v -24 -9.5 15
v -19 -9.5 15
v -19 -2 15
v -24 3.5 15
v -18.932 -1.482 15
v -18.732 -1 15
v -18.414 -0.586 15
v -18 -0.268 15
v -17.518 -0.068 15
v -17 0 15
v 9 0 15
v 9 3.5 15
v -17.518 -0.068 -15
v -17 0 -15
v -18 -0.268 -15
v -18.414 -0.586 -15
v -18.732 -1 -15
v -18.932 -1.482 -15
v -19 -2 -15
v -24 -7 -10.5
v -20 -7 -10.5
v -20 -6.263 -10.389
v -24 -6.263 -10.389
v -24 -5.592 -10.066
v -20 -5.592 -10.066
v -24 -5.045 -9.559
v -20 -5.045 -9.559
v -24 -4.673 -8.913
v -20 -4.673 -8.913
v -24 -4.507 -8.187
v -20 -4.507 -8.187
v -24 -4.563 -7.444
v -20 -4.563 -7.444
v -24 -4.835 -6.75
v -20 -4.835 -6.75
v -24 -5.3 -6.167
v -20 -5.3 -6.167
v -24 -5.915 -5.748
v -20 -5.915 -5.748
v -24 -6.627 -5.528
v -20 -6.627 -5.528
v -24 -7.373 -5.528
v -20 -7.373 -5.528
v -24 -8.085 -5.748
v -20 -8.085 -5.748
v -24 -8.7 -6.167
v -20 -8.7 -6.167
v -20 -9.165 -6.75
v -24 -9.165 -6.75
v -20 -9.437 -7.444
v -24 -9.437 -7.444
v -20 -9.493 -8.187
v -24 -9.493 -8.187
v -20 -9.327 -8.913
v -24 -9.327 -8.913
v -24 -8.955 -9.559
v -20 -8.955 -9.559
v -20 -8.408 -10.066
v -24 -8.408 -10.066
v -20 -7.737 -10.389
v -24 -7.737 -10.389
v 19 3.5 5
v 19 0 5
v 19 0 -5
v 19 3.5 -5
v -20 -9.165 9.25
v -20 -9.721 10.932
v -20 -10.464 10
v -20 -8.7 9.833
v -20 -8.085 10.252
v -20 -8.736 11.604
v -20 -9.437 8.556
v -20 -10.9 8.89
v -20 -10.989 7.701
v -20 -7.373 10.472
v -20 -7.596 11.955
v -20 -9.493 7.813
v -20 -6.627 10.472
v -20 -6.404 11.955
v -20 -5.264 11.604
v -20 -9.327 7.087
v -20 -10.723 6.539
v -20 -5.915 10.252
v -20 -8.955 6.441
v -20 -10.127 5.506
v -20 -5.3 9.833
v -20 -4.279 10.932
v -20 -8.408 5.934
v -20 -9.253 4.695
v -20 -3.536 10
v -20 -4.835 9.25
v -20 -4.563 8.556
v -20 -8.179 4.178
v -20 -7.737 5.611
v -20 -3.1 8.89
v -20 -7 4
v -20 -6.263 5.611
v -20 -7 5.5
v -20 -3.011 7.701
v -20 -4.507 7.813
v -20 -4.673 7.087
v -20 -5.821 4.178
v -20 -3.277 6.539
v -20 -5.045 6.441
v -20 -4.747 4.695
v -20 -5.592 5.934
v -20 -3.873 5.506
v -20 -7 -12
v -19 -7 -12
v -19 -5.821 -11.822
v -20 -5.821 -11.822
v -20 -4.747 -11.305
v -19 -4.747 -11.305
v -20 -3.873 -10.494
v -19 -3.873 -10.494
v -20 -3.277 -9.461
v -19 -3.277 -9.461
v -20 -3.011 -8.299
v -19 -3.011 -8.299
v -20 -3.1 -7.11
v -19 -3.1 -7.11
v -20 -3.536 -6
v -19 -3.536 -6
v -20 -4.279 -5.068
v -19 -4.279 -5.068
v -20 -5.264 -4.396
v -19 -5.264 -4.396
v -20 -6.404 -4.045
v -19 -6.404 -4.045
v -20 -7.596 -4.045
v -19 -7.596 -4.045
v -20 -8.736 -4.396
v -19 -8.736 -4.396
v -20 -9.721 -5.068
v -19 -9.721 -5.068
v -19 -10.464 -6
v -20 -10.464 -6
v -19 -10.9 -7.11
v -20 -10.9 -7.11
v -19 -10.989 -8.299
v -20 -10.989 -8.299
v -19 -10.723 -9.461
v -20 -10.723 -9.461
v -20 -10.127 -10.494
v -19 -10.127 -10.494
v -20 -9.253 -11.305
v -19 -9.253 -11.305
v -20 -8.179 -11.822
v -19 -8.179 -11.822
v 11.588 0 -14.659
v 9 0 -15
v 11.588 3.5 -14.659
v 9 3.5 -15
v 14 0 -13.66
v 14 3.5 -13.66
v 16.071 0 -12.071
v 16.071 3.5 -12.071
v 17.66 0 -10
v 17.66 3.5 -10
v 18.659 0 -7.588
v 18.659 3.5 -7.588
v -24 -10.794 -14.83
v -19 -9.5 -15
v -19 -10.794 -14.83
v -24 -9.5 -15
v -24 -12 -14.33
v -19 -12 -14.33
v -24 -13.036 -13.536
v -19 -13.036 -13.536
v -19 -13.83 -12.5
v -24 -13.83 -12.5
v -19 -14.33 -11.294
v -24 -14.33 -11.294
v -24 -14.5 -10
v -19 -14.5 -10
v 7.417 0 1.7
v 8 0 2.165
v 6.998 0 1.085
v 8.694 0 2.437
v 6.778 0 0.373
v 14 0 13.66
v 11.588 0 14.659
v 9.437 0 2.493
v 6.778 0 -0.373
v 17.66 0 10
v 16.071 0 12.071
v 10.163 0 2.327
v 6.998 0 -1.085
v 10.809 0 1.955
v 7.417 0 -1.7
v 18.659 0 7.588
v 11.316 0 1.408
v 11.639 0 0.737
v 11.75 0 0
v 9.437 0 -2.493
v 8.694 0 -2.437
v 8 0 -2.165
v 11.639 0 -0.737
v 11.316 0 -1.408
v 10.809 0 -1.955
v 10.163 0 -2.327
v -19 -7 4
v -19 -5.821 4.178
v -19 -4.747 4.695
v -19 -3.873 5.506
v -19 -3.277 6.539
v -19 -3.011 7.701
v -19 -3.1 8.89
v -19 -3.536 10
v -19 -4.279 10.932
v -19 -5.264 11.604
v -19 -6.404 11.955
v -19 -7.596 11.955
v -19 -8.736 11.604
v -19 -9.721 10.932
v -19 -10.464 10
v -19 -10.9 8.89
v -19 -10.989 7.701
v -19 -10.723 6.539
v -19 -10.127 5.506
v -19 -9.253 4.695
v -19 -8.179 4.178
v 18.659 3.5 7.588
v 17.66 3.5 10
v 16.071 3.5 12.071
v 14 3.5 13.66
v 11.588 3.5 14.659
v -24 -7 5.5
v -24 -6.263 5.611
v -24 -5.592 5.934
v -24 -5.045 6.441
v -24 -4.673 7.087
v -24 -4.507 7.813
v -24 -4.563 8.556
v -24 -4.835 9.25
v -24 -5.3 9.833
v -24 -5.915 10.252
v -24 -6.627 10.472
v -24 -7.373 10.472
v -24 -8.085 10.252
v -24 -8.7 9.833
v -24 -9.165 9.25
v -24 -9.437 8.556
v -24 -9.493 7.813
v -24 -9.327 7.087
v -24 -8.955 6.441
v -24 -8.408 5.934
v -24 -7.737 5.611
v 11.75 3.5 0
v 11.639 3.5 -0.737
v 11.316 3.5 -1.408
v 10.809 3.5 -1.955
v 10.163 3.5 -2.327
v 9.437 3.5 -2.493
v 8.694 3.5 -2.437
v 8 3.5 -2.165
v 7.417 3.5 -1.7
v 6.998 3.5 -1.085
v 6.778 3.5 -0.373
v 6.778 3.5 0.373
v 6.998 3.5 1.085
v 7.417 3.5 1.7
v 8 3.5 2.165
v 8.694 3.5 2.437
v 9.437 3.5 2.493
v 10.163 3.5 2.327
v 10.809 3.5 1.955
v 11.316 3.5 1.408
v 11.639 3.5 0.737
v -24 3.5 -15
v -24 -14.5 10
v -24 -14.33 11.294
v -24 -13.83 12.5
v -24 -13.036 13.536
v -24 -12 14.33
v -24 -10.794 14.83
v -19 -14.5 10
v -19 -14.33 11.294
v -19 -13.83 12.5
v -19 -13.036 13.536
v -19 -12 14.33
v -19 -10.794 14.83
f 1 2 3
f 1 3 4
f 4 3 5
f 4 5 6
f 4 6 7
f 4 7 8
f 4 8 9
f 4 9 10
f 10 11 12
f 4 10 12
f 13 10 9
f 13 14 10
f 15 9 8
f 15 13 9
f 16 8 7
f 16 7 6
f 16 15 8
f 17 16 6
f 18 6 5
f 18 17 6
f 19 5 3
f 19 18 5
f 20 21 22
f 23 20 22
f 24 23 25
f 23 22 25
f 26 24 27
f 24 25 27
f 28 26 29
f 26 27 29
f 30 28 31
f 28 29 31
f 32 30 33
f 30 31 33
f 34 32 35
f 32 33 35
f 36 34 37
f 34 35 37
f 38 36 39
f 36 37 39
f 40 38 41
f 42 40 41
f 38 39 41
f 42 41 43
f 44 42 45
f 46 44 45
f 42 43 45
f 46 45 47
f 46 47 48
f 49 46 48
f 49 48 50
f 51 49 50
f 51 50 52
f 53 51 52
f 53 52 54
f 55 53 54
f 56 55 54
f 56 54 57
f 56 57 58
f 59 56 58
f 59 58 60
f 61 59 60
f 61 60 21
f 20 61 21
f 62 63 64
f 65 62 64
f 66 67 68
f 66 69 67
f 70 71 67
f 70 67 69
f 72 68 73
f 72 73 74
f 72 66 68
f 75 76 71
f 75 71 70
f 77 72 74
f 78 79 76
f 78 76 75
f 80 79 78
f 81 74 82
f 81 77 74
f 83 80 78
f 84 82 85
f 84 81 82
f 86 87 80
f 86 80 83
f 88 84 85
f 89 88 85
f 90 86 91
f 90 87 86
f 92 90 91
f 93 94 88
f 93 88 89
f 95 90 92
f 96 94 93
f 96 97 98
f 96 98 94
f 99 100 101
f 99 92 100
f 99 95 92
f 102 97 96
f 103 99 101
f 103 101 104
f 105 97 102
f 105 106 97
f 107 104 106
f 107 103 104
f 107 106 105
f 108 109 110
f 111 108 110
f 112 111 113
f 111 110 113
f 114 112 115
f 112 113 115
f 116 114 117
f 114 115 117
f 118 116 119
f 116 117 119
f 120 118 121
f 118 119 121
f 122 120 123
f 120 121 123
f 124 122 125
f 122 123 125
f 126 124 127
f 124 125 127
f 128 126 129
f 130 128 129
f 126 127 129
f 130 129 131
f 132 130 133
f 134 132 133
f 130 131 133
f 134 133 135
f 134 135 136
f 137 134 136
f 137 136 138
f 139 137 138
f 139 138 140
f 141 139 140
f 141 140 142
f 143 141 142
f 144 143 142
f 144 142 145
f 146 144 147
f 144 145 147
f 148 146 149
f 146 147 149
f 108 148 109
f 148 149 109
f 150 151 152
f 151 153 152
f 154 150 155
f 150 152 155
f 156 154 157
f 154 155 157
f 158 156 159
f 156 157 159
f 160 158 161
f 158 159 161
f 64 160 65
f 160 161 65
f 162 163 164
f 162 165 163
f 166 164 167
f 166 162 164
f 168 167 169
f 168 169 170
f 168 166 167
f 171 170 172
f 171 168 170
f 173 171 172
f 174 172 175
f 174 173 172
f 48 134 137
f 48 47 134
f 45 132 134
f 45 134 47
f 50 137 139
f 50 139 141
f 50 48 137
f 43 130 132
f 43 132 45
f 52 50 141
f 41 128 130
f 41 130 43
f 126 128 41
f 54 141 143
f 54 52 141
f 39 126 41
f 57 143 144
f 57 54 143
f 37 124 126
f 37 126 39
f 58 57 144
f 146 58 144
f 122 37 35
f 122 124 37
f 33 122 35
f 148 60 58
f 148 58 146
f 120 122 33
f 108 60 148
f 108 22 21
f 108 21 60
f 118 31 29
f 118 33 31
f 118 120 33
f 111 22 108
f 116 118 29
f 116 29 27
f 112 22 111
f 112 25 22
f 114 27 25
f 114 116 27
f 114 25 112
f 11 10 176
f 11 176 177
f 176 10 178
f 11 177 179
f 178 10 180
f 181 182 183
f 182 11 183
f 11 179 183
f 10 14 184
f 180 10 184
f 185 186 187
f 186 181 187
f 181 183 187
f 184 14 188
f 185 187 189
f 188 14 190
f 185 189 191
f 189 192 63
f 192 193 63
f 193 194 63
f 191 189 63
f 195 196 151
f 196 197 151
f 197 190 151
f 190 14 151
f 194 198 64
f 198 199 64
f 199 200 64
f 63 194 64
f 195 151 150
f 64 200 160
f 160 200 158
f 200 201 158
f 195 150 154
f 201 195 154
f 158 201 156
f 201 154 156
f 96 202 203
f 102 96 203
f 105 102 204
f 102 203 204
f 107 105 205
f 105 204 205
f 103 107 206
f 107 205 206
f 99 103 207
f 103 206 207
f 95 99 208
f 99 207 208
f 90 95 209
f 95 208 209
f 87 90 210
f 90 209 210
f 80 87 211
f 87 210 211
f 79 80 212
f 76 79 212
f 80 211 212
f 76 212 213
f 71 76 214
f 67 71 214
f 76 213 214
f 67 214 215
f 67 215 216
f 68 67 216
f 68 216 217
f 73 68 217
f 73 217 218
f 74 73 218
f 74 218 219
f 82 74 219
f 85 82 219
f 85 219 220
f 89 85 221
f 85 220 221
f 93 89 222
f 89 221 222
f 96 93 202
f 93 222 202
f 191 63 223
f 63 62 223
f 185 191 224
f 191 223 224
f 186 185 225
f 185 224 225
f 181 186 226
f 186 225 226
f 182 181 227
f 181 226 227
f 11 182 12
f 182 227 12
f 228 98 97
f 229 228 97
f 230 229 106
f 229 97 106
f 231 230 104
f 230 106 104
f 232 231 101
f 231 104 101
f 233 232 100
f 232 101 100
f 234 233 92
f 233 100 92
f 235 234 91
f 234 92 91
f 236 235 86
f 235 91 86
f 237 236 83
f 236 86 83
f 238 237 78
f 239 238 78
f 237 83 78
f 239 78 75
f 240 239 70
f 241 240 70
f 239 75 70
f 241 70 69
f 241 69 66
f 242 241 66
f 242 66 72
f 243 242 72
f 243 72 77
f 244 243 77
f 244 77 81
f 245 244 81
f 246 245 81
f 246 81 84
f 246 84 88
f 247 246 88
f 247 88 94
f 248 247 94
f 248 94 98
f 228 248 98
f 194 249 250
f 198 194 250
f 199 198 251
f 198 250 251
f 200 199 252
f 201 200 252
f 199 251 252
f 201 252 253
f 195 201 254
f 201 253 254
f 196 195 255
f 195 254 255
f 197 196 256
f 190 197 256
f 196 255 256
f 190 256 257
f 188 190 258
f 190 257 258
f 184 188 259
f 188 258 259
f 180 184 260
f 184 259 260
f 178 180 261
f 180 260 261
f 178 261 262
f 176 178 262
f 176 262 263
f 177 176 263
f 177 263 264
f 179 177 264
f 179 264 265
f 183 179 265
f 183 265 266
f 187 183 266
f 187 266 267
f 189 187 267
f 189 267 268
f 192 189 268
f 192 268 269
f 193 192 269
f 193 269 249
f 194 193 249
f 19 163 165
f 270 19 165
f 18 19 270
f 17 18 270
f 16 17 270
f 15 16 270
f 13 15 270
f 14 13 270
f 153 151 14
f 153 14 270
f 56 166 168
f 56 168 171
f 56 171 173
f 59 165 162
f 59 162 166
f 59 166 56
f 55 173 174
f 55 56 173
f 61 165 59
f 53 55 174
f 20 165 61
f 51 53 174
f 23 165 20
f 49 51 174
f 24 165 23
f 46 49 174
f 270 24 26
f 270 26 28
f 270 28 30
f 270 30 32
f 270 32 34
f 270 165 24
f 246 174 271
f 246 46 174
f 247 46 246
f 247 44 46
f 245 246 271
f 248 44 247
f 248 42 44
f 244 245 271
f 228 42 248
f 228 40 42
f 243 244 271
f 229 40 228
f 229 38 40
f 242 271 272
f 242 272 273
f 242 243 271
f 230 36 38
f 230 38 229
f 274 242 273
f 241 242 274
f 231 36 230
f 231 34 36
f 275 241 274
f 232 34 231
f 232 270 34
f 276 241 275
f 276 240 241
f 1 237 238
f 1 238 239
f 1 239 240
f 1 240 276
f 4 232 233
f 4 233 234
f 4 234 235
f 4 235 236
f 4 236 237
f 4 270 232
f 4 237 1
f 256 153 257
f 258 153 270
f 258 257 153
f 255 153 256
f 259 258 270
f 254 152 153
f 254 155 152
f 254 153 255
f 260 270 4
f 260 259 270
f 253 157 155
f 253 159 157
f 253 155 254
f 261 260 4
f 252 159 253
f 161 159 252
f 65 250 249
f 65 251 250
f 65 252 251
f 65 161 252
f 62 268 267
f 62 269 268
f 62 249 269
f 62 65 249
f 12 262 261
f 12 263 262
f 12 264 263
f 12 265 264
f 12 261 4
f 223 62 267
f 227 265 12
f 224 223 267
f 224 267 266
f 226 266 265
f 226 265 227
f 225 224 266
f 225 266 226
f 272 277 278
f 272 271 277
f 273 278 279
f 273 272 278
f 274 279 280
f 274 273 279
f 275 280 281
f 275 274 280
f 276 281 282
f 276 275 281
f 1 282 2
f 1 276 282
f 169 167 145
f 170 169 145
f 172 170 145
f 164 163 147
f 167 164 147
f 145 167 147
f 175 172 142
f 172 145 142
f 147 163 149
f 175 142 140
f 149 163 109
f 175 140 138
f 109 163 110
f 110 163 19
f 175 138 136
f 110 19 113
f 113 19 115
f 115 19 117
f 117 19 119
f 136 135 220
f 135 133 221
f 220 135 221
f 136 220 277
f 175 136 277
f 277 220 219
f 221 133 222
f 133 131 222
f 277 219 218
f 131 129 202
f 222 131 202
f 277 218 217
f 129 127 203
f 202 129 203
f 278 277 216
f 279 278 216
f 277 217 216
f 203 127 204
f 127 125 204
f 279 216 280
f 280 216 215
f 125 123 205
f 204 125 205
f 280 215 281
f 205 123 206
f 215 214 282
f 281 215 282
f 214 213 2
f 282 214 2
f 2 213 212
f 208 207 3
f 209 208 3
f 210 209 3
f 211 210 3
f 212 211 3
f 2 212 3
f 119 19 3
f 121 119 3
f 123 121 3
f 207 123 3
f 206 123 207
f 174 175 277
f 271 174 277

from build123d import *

# Parameters (mm, degrees)
SKETCH1_W           = 38
SKETCH1_H           = 30
BOSS_EXTRUDE1_DEPTH = 3.5
SKETCH2_W           = 30
SKETCH2_H           = 18
BOSS_EXTRUDE2_DEPTH = 5
SKETCH3_R           = 4
CUT_EXTRUDE1_DEPTH  = 1
SKETCH4_R           = 2.5
CUT_EXTRUDE2_DEPTH  = 5
SKETCH5_R           = 2.5
CUT_EXTRUDE3_DEPTH  = 5
FILLET1_R           = 10
FILLET2_R           = 2
FILLET3_R           = 5


with BuildPart() as part:
    # Sketch1 → Boss-Extrude1 (new body)
    with BuildSketch(Plane(origin=(0, 0, 0), x_dir=(1, 0, 0), z_dir=(0, 1, 0))):
        Rectangle(SKETCH1_W, SKETCH1_H)
    extrude(amount=BOSS_EXTRUDE1_DEPTH)

    # Sketch2 → Boss-Extrude2 (add)
    with BuildSketch(Plane.ZY.offset(19)):
        with Locations((0, -5.5)):
            Rectangle(SKETCH2_W, SKETCH2_H)
    extrude(amount=BOSS_EXTRUDE2_DEPTH)

    # Sketch3 → Cut-Extrude1 (cut)
    with BuildSketch(Plane(origin=(-19, 0, 0), x_dir=(0, 0, -1), z_dir=(1, 0, 0))):
        with Locations((-8, -7)):
            Circle(SKETCH3_R)
        with Locations((8, -7)):
            Circle(SKETCH3_R)
    extrude(amount=-CUT_EXTRUDE1_DEPTH, mode=Mode.SUBTRACT)

    # Sketch4 → Cut-Extrude2 (cut)
    with BuildSketch(Plane(origin=(-20, 0, 0), x_dir=(0, 0, -1), z_dir=(1, 0, 0))):
        with Locations((-8, -7)):
            Circle(SKETCH4_R)
        with Locations((8, -7)):
            Circle(SKETCH4_R)
    extrude(amount=-CUT_EXTRUDE2_DEPTH, mode=Mode.SUBTRACT)

    # Sketch5 → Cut-Extrude3 (cut)
    with BuildSketch(Plane(origin=(0, 3.5, 0), x_dir=(1, 0, 0), z_dir=(0, 1, 0))):
        with Locations((9.25, 0)):
            Circle(SKETCH5_R)
    extrude(amount=-CUT_EXTRUDE3_DEPTH, mode=Mode.SUBTRACT)

    # Fillet1
    fillet1_edges = [part.edges().sort_by_distance(p)[0] for p in [
        (19, 1.75, -15),
        (19, 1.75, 15),
    ]]
    fillet(fillet1_edges, radius=FILLET1_R)

    # Fillet2
    fillet2_edges = [part.edges().sort_by_distance(p)[0] for p in [
        (-19, 0, 0),
    ]]
    fillet(fillet2_edges, radius=FILLET2_R)

    # Fillet3
    fillet3_edges = [part.edges().sort_by_distance(p)[0] for p in [
        (-21.5, -14.5, -15),
        (-21.5, -14.5, 15),
    ]]
    fillet(fillet3_edges, radius=FILLET3_R)


solid = part.part
